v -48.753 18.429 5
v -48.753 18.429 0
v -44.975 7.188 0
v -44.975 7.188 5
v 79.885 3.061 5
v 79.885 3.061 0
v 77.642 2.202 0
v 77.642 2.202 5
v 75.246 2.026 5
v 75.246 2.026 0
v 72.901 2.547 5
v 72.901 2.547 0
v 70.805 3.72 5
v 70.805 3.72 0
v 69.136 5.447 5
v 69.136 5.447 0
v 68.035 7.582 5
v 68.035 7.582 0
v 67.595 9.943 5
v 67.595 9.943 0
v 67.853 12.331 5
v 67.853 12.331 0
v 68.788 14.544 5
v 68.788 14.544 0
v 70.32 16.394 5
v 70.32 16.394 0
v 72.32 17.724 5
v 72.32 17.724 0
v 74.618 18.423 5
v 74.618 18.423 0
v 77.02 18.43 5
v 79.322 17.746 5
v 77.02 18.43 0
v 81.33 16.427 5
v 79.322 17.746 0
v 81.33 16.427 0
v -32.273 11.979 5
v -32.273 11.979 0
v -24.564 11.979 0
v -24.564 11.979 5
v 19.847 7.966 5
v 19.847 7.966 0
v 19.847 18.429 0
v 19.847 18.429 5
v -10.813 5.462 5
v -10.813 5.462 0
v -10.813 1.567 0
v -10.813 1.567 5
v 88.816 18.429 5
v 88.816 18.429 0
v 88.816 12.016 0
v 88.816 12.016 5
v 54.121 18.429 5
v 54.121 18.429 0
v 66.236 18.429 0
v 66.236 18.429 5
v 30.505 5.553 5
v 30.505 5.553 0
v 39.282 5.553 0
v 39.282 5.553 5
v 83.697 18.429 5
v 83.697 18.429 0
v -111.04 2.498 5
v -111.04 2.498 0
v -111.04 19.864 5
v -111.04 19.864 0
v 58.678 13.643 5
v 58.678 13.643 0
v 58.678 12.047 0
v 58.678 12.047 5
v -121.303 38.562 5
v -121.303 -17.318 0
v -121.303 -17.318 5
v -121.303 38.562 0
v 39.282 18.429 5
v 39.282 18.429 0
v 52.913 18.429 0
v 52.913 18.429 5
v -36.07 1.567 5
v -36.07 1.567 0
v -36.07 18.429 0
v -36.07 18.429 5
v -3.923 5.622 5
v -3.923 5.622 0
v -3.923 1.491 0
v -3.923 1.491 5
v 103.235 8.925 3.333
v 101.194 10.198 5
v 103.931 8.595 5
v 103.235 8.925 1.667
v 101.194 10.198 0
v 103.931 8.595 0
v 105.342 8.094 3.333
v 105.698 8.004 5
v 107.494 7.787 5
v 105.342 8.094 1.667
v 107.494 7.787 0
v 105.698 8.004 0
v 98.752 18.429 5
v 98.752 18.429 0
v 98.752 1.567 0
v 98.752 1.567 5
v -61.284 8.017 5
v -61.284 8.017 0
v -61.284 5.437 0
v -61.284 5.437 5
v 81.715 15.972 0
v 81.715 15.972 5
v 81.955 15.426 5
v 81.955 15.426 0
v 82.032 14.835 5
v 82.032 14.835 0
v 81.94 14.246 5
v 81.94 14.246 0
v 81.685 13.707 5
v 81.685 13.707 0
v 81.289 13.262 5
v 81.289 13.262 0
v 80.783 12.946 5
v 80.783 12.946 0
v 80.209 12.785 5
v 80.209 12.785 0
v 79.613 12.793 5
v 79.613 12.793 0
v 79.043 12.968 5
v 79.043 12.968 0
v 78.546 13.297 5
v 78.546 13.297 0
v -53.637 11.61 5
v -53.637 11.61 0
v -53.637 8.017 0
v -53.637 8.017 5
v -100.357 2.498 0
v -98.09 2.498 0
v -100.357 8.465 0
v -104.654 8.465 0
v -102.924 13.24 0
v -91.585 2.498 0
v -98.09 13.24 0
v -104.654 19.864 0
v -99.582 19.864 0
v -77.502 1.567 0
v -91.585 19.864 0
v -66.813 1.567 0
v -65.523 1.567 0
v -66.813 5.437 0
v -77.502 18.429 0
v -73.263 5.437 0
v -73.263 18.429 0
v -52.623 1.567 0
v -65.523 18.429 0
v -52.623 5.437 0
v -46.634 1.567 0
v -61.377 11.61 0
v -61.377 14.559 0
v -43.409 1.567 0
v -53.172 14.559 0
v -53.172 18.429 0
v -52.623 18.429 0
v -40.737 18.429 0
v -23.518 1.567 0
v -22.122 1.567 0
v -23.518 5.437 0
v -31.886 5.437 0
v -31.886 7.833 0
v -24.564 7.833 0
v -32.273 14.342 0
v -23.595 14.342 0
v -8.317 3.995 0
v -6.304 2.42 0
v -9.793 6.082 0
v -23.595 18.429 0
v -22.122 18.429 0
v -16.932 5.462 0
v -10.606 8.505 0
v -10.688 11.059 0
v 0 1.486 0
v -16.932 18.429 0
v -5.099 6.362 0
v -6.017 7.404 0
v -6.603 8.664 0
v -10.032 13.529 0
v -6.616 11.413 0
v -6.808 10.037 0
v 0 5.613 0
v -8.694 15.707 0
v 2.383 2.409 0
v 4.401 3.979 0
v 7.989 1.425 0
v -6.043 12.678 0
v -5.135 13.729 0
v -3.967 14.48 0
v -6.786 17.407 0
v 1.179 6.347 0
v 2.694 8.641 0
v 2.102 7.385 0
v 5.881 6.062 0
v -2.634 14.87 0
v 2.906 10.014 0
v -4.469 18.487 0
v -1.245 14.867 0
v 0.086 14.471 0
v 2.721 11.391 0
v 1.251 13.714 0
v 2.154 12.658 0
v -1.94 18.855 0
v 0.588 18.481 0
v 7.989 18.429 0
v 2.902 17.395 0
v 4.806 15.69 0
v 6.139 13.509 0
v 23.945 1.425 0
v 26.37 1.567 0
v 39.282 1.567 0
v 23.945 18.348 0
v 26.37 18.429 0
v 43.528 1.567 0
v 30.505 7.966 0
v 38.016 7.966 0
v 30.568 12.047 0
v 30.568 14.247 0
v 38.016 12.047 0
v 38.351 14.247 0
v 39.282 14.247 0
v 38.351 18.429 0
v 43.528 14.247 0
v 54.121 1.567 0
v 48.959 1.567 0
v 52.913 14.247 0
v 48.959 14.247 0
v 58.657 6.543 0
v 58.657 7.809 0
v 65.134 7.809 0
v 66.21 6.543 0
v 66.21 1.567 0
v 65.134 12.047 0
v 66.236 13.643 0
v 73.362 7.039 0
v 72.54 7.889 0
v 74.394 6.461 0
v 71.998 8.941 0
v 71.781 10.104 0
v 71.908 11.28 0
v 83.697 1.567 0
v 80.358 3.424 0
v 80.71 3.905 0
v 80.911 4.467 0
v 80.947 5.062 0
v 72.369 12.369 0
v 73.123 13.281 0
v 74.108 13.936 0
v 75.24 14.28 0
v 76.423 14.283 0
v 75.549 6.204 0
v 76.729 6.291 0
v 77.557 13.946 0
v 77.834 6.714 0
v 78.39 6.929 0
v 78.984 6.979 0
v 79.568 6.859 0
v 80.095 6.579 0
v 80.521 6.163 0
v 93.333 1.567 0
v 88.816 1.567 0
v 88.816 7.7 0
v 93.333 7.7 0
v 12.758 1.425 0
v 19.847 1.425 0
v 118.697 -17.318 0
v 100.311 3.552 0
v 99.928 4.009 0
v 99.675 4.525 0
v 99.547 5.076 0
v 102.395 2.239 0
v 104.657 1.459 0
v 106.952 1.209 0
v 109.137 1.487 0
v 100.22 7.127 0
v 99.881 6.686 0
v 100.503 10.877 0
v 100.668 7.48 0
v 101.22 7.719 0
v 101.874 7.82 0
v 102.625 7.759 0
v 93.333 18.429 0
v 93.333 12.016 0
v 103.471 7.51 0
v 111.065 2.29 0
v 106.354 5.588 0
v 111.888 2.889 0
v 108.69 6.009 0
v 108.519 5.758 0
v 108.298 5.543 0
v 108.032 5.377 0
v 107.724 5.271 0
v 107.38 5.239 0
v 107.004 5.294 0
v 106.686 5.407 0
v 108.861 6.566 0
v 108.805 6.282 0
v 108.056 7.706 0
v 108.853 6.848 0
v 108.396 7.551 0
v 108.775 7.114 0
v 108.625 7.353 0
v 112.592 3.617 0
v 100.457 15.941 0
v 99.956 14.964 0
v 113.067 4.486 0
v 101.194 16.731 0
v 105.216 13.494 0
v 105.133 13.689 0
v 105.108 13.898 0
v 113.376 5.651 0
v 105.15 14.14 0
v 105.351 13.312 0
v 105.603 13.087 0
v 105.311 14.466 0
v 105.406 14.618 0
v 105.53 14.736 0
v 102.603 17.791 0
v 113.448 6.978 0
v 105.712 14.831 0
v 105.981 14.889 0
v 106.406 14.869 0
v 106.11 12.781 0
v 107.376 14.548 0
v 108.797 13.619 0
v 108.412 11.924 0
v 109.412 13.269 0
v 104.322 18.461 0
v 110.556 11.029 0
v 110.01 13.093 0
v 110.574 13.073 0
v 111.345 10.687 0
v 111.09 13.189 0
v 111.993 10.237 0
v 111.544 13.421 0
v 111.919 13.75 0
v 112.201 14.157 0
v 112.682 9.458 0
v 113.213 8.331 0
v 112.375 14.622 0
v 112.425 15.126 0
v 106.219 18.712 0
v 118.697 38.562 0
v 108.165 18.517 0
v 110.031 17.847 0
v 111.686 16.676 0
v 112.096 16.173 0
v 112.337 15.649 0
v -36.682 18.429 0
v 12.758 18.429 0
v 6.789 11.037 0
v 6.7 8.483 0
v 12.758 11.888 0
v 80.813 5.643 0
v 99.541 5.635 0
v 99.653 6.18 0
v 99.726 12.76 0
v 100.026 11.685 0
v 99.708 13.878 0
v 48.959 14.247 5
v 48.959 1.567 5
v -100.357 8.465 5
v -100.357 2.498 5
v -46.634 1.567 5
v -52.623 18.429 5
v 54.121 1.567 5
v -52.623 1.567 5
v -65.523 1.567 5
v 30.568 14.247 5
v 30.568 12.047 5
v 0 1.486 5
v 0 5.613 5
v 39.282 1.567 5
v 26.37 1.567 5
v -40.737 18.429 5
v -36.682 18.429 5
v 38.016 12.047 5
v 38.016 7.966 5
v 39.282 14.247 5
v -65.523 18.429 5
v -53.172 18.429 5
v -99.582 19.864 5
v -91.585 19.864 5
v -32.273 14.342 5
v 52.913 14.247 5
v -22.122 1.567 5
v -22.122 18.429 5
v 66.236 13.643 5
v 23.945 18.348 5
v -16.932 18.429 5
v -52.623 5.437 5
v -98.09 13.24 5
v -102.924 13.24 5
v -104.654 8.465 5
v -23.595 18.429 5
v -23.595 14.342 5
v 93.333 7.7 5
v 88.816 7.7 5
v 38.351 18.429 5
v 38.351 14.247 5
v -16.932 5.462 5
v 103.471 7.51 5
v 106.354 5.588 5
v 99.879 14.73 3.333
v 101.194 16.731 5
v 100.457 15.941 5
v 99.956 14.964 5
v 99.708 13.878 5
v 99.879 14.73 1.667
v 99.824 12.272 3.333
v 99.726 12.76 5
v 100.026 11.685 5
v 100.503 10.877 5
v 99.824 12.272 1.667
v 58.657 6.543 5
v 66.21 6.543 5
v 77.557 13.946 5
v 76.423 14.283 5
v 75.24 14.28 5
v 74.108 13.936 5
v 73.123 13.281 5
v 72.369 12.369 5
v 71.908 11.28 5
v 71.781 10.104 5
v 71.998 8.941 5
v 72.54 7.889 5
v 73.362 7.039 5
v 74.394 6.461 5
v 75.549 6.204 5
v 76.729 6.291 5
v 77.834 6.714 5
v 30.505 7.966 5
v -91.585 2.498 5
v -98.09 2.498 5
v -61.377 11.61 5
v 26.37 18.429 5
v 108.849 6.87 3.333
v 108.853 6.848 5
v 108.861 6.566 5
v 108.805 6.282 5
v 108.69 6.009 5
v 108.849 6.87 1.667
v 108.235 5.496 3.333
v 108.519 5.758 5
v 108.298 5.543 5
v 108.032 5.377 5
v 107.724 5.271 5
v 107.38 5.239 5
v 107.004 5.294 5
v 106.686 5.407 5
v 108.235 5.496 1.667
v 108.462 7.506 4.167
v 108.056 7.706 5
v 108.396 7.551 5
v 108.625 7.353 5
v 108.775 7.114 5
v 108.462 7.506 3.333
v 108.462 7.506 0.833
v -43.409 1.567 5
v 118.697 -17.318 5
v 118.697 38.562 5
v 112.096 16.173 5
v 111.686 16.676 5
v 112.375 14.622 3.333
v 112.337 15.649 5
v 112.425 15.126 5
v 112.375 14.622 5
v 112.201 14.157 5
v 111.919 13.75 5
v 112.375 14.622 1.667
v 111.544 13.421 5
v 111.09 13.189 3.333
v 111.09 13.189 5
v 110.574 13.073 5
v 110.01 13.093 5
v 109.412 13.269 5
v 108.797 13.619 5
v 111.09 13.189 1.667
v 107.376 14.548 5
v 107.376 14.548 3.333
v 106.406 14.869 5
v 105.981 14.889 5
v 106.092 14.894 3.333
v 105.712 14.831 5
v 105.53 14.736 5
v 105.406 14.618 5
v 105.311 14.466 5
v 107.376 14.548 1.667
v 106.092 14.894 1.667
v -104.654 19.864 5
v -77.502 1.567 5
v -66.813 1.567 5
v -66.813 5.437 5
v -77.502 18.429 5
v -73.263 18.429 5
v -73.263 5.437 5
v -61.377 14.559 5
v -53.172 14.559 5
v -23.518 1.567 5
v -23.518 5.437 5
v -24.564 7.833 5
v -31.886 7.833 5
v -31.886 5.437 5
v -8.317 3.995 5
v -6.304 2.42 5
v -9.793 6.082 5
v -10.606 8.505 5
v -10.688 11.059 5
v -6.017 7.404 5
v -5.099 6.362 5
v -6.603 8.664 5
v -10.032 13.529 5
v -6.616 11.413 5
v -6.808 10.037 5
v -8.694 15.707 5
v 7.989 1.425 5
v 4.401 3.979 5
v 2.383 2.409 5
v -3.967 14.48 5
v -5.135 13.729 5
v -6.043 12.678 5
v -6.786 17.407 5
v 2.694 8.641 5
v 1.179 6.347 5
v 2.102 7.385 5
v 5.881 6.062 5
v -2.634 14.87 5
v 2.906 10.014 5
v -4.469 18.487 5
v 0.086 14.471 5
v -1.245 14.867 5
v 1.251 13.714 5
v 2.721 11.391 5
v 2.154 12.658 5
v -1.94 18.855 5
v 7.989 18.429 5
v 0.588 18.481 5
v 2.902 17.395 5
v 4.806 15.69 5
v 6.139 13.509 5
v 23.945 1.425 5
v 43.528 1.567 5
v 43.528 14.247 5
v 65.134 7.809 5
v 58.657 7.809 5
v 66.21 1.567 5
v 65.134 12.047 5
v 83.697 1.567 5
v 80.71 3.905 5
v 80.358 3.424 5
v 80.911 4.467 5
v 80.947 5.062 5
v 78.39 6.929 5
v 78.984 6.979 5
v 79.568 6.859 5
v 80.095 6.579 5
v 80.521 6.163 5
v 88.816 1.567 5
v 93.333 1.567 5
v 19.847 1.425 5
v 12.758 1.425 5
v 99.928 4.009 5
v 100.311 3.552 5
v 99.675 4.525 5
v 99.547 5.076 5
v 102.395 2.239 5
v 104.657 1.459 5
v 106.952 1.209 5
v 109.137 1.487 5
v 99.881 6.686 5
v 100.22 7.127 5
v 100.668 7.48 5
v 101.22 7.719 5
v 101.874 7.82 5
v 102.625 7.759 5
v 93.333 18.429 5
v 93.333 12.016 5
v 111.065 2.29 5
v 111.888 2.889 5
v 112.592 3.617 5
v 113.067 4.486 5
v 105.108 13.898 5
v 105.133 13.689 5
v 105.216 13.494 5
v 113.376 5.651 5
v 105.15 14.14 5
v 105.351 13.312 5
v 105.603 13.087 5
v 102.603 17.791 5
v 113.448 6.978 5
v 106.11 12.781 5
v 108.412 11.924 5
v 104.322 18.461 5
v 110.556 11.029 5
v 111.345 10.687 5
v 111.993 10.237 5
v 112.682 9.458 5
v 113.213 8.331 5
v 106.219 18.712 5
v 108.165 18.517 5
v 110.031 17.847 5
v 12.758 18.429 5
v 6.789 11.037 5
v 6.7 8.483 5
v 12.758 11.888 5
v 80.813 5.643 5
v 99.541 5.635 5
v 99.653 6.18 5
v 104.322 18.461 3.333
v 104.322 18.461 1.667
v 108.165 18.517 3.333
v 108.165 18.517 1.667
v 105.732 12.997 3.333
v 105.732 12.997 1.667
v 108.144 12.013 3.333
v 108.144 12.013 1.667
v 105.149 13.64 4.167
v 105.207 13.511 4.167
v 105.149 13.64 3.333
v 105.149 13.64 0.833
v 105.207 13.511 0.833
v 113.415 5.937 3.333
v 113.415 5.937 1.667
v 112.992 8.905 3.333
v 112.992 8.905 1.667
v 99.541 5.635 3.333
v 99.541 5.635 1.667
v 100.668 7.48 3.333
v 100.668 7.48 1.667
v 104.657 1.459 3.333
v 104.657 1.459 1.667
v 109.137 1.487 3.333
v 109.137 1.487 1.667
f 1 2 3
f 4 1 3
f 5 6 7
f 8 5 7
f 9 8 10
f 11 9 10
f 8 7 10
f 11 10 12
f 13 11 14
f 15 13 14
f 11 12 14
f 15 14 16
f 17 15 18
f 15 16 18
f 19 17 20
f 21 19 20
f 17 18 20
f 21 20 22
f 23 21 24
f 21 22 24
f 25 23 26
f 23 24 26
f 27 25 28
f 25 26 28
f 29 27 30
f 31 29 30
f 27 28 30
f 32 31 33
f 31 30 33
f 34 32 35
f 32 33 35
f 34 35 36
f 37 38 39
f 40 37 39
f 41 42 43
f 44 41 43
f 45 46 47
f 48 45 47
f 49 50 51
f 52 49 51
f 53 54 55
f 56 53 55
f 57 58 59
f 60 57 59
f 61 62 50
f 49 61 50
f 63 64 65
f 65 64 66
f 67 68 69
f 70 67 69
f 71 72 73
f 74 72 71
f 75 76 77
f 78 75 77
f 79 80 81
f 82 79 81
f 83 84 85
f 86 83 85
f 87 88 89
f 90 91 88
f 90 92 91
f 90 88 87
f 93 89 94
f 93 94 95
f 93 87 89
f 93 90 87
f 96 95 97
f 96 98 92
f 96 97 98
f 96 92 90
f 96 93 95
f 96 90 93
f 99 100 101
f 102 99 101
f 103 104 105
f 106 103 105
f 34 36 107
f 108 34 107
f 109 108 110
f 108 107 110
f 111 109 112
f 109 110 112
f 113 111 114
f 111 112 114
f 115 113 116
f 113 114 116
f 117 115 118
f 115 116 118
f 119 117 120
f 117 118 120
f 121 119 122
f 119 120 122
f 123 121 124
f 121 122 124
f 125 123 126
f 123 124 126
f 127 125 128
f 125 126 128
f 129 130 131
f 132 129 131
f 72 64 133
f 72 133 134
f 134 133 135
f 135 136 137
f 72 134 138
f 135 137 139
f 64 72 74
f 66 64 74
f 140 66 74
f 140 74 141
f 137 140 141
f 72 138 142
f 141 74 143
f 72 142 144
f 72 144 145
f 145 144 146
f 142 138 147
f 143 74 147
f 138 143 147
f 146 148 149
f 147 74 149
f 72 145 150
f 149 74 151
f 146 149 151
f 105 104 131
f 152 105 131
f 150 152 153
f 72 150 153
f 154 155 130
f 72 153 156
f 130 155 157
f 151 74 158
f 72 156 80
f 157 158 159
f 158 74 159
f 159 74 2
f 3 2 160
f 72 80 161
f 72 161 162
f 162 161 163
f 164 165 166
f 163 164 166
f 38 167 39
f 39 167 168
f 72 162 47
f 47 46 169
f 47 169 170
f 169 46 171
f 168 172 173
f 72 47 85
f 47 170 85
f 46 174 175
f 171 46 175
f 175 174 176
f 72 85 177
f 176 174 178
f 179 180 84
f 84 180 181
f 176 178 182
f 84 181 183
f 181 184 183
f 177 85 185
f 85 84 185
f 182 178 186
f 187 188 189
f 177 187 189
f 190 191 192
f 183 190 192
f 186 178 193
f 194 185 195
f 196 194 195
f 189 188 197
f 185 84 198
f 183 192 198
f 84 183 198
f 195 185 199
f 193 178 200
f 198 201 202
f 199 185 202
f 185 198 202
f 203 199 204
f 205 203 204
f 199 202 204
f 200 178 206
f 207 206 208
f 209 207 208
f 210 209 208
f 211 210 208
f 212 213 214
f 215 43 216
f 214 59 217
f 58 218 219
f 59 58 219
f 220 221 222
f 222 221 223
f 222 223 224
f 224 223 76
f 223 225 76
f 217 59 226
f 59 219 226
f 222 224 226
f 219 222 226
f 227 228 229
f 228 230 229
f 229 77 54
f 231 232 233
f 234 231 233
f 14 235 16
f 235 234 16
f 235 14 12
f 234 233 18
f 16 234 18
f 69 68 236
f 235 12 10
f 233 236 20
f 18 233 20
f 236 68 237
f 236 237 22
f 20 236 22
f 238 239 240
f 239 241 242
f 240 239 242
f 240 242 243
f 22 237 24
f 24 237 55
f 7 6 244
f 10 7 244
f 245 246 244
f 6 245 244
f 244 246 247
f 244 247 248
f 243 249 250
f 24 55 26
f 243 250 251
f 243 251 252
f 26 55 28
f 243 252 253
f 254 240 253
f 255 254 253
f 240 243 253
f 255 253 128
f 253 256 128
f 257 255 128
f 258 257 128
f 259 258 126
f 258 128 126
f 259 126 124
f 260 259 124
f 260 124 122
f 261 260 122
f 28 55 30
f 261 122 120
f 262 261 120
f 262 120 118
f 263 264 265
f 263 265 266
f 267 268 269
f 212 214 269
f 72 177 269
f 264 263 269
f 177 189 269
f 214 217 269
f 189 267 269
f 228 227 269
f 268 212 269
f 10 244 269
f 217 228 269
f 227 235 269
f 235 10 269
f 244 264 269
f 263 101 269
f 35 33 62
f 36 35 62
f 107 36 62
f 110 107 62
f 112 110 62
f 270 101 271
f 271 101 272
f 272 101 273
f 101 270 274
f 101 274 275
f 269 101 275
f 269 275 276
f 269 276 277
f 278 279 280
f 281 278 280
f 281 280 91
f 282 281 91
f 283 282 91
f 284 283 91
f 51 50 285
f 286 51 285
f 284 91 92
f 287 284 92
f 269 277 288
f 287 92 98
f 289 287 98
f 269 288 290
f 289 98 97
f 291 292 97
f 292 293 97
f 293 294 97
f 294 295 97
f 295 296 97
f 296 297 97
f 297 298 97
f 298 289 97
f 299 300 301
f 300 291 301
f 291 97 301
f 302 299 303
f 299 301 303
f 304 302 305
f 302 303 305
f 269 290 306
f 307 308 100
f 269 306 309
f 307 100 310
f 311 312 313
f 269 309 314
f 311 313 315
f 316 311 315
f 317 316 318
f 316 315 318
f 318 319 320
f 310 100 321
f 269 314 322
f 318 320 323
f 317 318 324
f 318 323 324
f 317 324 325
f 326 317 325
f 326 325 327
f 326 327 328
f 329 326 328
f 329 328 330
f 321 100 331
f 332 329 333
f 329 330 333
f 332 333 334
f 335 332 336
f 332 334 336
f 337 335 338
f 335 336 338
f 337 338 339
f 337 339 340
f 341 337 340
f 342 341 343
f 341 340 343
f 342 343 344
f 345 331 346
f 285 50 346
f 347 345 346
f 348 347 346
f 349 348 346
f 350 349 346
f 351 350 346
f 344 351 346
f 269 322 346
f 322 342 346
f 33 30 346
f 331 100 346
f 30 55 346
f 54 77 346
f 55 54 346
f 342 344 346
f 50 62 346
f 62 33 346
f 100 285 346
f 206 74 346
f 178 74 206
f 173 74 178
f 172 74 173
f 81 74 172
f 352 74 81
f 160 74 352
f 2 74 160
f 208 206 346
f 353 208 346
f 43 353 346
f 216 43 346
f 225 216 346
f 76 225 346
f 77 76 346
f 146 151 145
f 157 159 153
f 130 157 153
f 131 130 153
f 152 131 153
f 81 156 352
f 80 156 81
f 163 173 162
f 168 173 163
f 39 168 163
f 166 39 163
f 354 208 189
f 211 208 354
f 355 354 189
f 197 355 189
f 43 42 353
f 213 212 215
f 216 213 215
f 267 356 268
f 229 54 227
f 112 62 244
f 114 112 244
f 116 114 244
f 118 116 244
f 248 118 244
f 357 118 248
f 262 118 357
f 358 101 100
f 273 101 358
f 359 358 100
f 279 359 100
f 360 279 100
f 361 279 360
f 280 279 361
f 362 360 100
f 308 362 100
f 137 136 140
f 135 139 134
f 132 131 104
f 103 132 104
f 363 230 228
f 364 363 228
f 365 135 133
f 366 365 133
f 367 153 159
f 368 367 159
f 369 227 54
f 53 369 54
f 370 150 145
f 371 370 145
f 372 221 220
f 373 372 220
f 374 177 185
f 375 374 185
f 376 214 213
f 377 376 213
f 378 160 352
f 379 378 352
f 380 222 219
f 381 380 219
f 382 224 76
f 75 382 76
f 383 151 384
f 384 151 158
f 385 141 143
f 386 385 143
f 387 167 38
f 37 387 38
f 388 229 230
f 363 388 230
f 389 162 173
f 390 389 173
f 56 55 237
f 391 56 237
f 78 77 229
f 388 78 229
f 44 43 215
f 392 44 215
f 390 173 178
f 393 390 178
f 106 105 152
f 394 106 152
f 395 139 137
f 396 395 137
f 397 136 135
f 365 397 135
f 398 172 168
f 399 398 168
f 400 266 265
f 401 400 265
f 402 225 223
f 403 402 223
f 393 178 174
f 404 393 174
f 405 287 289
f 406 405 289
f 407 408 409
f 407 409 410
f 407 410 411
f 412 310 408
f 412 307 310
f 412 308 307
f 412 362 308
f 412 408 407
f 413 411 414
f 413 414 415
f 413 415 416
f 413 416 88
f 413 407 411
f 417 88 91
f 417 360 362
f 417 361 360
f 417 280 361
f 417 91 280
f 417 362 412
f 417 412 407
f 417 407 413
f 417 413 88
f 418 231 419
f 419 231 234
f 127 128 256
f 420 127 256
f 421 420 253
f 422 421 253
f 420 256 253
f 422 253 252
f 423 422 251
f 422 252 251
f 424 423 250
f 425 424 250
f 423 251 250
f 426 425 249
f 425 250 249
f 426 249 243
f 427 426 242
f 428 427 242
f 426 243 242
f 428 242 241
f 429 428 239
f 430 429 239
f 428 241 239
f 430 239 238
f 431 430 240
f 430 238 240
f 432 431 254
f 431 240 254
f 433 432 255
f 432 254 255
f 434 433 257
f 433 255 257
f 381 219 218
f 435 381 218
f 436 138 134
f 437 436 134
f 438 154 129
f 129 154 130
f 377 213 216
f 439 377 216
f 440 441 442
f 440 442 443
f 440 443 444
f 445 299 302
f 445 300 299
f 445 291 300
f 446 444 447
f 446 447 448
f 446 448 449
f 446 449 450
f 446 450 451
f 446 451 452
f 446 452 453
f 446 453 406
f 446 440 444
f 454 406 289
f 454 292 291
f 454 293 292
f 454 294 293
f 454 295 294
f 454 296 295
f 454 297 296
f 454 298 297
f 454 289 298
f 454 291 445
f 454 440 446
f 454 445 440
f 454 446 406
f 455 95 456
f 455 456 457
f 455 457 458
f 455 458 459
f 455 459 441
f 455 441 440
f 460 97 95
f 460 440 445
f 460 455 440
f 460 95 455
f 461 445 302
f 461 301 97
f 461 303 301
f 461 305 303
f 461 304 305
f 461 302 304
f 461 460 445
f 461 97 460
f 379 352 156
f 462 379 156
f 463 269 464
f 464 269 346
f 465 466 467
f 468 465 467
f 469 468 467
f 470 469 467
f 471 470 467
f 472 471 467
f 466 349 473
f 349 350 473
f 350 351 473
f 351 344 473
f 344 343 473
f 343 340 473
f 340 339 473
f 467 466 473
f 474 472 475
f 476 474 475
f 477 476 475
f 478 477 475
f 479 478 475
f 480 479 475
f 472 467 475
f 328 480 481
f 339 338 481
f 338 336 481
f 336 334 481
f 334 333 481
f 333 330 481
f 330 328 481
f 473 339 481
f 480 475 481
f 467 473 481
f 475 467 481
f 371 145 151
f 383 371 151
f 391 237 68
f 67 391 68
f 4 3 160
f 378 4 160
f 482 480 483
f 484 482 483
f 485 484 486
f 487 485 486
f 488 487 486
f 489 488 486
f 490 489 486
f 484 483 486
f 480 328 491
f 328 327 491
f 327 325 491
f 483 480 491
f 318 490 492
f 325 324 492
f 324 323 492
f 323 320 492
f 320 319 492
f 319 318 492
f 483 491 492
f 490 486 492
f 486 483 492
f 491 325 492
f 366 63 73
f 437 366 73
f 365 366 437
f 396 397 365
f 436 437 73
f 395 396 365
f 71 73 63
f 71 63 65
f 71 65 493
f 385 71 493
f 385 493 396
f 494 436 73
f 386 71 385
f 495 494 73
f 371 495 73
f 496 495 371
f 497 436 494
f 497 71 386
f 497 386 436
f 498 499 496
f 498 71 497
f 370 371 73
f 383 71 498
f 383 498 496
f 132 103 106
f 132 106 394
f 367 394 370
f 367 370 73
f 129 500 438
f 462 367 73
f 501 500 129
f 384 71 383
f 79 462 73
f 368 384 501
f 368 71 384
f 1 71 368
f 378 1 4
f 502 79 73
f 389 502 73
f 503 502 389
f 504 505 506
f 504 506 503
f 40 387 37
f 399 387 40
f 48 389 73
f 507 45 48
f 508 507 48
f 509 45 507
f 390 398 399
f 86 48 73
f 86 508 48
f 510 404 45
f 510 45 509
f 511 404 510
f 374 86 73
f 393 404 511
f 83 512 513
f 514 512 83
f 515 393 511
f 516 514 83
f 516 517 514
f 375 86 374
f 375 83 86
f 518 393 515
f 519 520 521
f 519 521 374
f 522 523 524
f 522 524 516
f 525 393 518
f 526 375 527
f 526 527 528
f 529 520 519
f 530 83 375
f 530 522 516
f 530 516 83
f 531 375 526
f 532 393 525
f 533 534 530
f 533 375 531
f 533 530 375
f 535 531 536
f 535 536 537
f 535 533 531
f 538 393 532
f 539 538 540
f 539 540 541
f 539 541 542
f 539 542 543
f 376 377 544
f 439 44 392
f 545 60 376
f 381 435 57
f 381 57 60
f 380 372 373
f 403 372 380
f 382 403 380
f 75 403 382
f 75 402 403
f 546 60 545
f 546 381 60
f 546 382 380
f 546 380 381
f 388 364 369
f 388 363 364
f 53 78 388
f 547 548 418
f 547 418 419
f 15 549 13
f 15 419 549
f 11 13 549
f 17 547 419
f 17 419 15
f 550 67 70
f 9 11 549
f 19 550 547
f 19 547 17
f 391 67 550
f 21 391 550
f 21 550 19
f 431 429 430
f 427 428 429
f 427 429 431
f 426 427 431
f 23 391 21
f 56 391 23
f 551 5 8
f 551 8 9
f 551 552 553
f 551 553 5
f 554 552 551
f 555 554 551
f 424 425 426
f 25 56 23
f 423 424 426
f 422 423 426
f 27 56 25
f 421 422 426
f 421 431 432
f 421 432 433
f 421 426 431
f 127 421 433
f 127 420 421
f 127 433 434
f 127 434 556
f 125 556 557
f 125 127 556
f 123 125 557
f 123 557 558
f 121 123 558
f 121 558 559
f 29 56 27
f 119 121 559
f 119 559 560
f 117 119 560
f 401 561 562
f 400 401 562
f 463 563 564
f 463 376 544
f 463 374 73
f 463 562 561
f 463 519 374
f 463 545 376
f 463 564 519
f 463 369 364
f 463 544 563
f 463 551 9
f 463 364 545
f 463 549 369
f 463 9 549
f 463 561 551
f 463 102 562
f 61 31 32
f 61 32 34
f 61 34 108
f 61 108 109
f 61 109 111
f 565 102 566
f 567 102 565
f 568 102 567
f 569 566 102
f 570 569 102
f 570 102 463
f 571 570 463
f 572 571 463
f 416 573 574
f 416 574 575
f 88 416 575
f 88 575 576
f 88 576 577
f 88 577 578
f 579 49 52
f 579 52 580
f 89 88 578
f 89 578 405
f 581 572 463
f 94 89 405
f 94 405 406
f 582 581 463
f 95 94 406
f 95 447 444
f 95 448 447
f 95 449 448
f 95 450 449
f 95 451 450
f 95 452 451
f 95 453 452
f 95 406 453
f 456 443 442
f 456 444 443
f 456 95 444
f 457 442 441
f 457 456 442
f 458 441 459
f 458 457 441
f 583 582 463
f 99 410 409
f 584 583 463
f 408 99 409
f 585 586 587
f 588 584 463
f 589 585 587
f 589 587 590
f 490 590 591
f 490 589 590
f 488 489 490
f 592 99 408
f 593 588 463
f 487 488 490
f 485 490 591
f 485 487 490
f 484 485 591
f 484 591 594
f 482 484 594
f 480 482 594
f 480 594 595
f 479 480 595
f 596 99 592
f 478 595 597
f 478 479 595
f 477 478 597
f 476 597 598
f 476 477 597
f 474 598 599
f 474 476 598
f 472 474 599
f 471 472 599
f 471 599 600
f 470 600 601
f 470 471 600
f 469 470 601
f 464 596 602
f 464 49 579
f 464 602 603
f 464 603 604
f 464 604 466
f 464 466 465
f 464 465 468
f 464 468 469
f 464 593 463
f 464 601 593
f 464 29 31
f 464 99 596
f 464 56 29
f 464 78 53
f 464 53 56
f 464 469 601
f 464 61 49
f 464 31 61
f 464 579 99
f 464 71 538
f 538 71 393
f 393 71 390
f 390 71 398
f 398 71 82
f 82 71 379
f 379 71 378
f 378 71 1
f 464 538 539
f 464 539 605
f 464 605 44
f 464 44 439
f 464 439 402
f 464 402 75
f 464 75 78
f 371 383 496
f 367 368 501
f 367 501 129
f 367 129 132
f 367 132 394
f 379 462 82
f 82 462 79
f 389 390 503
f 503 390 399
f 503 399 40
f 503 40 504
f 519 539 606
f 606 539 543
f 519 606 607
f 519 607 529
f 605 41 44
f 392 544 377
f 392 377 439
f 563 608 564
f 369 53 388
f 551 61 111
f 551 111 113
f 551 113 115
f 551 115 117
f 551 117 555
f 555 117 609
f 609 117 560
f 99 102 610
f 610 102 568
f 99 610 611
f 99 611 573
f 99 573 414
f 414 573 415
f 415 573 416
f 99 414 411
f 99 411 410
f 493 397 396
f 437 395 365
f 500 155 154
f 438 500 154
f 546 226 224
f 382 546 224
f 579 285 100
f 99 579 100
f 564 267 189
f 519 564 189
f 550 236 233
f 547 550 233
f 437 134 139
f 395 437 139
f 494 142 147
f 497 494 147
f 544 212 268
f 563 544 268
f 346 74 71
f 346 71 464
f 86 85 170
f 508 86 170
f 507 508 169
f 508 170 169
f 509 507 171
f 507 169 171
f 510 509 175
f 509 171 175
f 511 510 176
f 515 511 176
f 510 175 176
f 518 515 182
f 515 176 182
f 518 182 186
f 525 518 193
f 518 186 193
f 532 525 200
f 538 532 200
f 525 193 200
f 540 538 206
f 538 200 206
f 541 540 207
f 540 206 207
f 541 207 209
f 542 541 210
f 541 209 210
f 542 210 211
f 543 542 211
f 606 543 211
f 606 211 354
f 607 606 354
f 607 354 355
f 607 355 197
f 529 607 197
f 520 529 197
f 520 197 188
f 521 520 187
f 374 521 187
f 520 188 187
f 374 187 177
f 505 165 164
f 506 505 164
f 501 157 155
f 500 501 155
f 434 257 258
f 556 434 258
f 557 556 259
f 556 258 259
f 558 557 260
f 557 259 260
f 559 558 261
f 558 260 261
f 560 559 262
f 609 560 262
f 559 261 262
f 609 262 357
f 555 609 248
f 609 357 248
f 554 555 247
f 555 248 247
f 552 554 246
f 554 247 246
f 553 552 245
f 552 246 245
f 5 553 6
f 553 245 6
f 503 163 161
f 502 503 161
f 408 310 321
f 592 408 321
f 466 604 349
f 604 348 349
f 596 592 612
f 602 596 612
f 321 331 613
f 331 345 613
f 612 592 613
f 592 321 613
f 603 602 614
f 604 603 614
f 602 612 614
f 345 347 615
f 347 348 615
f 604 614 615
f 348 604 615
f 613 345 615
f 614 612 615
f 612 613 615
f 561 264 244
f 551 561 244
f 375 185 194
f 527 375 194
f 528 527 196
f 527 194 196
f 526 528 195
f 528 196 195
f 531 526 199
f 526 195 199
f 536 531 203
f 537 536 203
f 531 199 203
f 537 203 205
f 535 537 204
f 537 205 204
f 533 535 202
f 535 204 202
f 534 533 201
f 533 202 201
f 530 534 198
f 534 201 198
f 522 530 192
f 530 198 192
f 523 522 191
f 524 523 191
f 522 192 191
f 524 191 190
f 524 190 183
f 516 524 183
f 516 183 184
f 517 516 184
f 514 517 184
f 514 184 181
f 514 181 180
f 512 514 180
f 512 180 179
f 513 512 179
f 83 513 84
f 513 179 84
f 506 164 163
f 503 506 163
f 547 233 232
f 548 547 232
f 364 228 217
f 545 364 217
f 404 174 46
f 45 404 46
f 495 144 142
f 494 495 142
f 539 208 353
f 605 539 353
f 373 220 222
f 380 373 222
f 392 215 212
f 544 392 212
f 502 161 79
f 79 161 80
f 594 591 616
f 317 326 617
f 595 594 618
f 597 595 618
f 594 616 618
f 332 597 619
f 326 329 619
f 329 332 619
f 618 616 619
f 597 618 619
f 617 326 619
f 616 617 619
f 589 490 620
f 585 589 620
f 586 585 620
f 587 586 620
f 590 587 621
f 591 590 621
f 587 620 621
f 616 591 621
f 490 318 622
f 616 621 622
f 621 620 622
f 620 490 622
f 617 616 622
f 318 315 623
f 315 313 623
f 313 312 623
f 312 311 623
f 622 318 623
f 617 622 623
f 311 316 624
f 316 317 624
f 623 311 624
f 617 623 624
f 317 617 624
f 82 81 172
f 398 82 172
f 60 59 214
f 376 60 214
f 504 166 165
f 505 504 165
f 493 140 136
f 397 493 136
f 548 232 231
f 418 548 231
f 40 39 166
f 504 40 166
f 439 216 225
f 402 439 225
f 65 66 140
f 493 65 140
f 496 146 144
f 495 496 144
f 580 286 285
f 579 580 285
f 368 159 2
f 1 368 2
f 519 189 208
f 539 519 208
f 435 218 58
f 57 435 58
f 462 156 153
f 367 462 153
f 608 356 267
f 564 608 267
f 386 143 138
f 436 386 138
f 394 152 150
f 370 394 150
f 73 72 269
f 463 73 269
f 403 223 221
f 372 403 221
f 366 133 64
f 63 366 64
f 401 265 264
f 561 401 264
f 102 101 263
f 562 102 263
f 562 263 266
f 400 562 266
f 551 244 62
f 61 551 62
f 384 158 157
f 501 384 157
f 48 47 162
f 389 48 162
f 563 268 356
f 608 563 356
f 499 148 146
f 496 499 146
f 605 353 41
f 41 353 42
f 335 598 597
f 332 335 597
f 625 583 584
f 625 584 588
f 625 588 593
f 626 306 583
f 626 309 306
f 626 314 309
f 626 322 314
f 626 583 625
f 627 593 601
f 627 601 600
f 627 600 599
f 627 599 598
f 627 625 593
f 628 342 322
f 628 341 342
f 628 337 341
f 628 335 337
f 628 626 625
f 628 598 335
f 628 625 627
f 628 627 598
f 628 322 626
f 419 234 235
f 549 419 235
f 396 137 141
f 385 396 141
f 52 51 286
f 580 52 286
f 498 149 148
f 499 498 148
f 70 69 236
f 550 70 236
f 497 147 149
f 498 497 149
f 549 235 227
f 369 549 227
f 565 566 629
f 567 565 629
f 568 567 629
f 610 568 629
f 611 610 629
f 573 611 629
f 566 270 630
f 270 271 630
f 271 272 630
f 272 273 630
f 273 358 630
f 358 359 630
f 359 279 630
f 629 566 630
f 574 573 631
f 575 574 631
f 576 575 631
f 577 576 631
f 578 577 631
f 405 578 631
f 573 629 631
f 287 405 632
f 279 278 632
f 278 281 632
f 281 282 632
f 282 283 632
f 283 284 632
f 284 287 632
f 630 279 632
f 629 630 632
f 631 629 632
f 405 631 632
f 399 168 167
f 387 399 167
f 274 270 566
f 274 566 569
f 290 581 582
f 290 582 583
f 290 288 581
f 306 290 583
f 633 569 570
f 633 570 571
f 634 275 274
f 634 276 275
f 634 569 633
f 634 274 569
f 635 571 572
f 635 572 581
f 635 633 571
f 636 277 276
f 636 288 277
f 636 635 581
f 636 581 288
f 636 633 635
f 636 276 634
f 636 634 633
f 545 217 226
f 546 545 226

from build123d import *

# Parameters (mm, degrees)
F0_W     = 240
F0_H     = 55.88
F1_DEPTH = 5


with BuildPart() as f1:
    # F0 (on Top) → F1 (new body)
    with BuildSketch(Plane.XY):
        with Locations((-1.303092, 10.622495)):
            Rectangle(F0_W, F0_H)
        Polygon((-77.501602, 1.566828), (-77.501602, 18.42894), (-73.263034, 18.42894), (-73.263034, 5.436821), (-66.813052, 5.436821), (-66.813052, 1.566828), align=None, mode=Mode.SUBTRACT)
        Polygon((-65.523051, 1.566828), (-65.523051, 18.42894), (-53.171746, 18.42894), (-53.171746, 14.558948), (-61.376628, 14.558948), (-61.376628, 11.610381), (-53.63664, 11.610381), (-53.63664, 8.016816), (-61.284486, 8.016816), (-61.284486, 5.436821), (-52.623071, 5.436821), (-52.623071, 1.566828), align=None, mode=Mode.SUBTRACT)
        Polygon((-46.633799, 1.566828), (-52.623071, 18.42894), (-48.753079, 18.42894), (-44.975229, 7.187532), (-40.736664, 18.42894), (-36.682386, 18.42894), (-43.408804, 1.566828), align=None, mode=Mode.SUBTRACT)
        Polygon((-36.069706, 1.566828), (-36.069706, 18.42894), (-23.595029, 18.42894), (-23.595029, 14.341751), (-32.273065, 14.341751), (-32.273065, 11.978536), (-24.56356, 11.978536), (-24.56356, 7.833225), (-31.885654, 7.833225), (-31.885654, 5.436821), (-23.517547, 5.436821), (-23.517547, 1.566828), align=None, mode=Mode.SUBTRACT)
        Polygon((-22.122035, 1.566828), (-22.122035, 18.42894), (-16.931558, 18.42894), (-16.931558, 5.461609), (-10.812703, 5.461609), (-10.812703, 1.566828), align=None, mode=Mode.SUBTRACT)
        with BuildLine():
            Line((0, 1.486314), (0, 5.613023))
            ThreePointArc((0, 5.613023), (-1.939251, 14.918573), (-3.923162, 5.622442))
            Line((-3.923162, 5.622442), (-3.923162, 1.491197))
            ThreePointArc((-3.923162, 1.491197), (-1.939969, 18.855408), (0, 1.486314))
        make_face(mode=Mode.SUBTRACT)
        Polygon((12.757826, 1.425337), (7.98934, 1.425337), (7.98934, 18.42894), (12.757826, 18.42894), (19.847259, 7.966181), (19.847259, 18.42894), (23.944732, 18.348456), (23.944732, 1.425337), (19.847259, 1.425337), (12.757826, 11.888096), align=None, mode=Mode.SUBTRACT)
        Polygon((26.369521, 1.566828), (26.369521, 18.42894), (38.351353, 18.42894), (38.351353, 14.247308), (30.56819, 14.247308), (30.56819, 12.04724), (38.016446, 12.04724), (38.016446, 7.966181), (30.505024, 7.966181), (30.505024, 5.552883), (39.282415, 5.552883), (39.282415, 1.566828), align=None, mode=Mode.SUBTRACT)
        Polygon((39.282415, 14.247308), (39.282415, 18.42894), (52.912835, 18.42894), (52.912835, 14.247308), (48.958834, 14.247308), (48.958834, 1.566828), (43.528017, 1.566828), (43.528017, 14.247308), align=None, mode=Mode.SUBTRACT)
        Polygon((54.121282, 1.566828), (54.121282, 18.42894), (66.235885, 18.42894), (66.235885, 13.642738), (58.677584, 13.642738), (58.677584, 12.04724), (65.13413, 12.04724), (65.13413, 7.809057), (58.656581, 7.809057), (58.656581, 6.543087), (66.210203, 6.543087), (66.210203, 1.566828), align=None, mode=Mode.SUBTRACT)
        with BuildLine():
            ThreePointArc((81.330004, 16.427406), (81.502994, 13.470076), (78.545664, 13.297086))
            ThreePointArc((78.545664, 13.297086), (71.801666, 10.696378), (77.833893, 6.714239))
            ThreePointArc((77.833893, 6.714239), (80.685897, 5.913115), (79.884773, 3.061112))
            ThreePointArc((79.884773, 3.061112), (67.636498, 11.146737), (81.330004, 16.427406))
        make_face(mode=Mode.SUBTRACT)
        Polygon((83.697356, 1.566828), (83.697356, 18.42894), (88.816062, 18.42894), (88.816062, 12.015753), (93.332559, 12.015753), (93.332559, 18.42894), (98.752365, 18.42894), (98.752365, 1.566828), (93.332559, 1.566828), (93.332559, 7.699986), (88.816062, 7.699986), (88.816062, 1.566828), align=None, mode=Mode.SUBTRACT)
        with BuildLine():
            add(Edge.make_bspline(
                [(101.193711, 16.731108), (99.303506, 15.238125), (99.056959, 11.800154), (101.193711, 10.197595)],
                knots=[0, 0, 0, 0, 6.533513, 6.533513, 6.533513, 6.533513], degree=3))
            add(Edge.make_bspline(
                [(101.193711, 16.731108), (103.618093, 19.223979), (108.672321, 19.539012), (111.685678, 16.67632)],
                knots=[0, 0, 0, 0, 10.49211, 10.49211, 10.49211, 10.49211], degree=3))
            add(Edge.make_bspline(
                [(111.685678, 16.67632), (113.683753, 14.726316), (111.273028, 11.843219), (108.797148, 13.618685)],
                knots=[0, 0, 0, 0, 4.206274, 4.206274, 4.206274, 4.206274], degree=3))
            add(Edge.make_bspline(
                [(108.797148, 13.618685), (107.428901, 14.775181), (105.71859, 15.345286), (105.311371, 14.465697)],
                knots=[0, 0, 0, 0, 3.587209, 3.587209, 3.587209, 3.587209], degree=3))
            add(Edge.make_bspline(
                [(105.311371, 14.465697), (104.073435, 12.592498), (108.808008, 12.174423), (110.556327, 11.028785)],
                knots=[0, 0, 0, 0, 6.270719, 6.270719, 6.270719, 6.270719], degree=3))
            add(Edge.make_bspline(
                [(112.592414, 3.617435), (113.781482, 5.115994), (114.253856, 9.823423), (110.556327, 11.028785)],
                knots=[0, 0, 0, 0, 7.685946, 7.685946, 7.685946, 7.685946], degree=3))
            add(Edge.make_bspline(
                [(100.31075, 3.552281), (104.203738, 0.392276), (110.035092, 0.441142), (112.592414, 3.617435)],
                knots=[0, 0, 0, 0, 12.281837, 12.281837, 12.281837, 12.281837], degree=3))
            add(Edge.make_bspline(
                [(100.31075, 3.552281), (98.51899, 5.230014), (99.903531, 8.911257), (103.47075, 7.51043)],
                knots=[0, 0, 0, 0, 5.064834, 5.064834, 5.064834, 5.064834], degree=3))
            Line((103.47075, 7.51043), (106.353849, 5.588366))
            add(Edge.make_bspline(
                [(107.494056, 7.787338), (110.067666, 7.738471), (108.634263, 4.122384), (106.353849, 5.588366)],
                knots=[0, 0, 0, 0, 2.477004, 2.477004, 2.477004, 2.477004], degree=3))
            add(Edge.make_bspline(
                [(101.193711, 10.197595), (103.193842, 8.732081), (105.327658, 7.803626), (107.494056, 7.787338)],
                knots=[0, 0, 0, 0, 6.745642, 6.745642, 6.745642, 6.745642], degree=3))
        make_face(mode=Mode.SUBTRACT)
        Polygon((-111.039914, 2.497631), (-111.039914, 19.864045), (-104.65432, 19.864045), (-104.65432, 8.465471), (-100.35748, 8.465471), (-100.35748, 2.497631), align=None, mode=Mode.SUBTRACT)
        Polygon((-91.584757, 19.864045), (-91.584757, 2.497631), (-98.089702, 2.497631), (-98.089702, 13.239743), (-102.923647, 13.239743), (-99.581659, 19.864045), align=None, mode=Mode.SUBTRACT)
    extrude(amount=F1_DEPTH)


solid = f1.part
